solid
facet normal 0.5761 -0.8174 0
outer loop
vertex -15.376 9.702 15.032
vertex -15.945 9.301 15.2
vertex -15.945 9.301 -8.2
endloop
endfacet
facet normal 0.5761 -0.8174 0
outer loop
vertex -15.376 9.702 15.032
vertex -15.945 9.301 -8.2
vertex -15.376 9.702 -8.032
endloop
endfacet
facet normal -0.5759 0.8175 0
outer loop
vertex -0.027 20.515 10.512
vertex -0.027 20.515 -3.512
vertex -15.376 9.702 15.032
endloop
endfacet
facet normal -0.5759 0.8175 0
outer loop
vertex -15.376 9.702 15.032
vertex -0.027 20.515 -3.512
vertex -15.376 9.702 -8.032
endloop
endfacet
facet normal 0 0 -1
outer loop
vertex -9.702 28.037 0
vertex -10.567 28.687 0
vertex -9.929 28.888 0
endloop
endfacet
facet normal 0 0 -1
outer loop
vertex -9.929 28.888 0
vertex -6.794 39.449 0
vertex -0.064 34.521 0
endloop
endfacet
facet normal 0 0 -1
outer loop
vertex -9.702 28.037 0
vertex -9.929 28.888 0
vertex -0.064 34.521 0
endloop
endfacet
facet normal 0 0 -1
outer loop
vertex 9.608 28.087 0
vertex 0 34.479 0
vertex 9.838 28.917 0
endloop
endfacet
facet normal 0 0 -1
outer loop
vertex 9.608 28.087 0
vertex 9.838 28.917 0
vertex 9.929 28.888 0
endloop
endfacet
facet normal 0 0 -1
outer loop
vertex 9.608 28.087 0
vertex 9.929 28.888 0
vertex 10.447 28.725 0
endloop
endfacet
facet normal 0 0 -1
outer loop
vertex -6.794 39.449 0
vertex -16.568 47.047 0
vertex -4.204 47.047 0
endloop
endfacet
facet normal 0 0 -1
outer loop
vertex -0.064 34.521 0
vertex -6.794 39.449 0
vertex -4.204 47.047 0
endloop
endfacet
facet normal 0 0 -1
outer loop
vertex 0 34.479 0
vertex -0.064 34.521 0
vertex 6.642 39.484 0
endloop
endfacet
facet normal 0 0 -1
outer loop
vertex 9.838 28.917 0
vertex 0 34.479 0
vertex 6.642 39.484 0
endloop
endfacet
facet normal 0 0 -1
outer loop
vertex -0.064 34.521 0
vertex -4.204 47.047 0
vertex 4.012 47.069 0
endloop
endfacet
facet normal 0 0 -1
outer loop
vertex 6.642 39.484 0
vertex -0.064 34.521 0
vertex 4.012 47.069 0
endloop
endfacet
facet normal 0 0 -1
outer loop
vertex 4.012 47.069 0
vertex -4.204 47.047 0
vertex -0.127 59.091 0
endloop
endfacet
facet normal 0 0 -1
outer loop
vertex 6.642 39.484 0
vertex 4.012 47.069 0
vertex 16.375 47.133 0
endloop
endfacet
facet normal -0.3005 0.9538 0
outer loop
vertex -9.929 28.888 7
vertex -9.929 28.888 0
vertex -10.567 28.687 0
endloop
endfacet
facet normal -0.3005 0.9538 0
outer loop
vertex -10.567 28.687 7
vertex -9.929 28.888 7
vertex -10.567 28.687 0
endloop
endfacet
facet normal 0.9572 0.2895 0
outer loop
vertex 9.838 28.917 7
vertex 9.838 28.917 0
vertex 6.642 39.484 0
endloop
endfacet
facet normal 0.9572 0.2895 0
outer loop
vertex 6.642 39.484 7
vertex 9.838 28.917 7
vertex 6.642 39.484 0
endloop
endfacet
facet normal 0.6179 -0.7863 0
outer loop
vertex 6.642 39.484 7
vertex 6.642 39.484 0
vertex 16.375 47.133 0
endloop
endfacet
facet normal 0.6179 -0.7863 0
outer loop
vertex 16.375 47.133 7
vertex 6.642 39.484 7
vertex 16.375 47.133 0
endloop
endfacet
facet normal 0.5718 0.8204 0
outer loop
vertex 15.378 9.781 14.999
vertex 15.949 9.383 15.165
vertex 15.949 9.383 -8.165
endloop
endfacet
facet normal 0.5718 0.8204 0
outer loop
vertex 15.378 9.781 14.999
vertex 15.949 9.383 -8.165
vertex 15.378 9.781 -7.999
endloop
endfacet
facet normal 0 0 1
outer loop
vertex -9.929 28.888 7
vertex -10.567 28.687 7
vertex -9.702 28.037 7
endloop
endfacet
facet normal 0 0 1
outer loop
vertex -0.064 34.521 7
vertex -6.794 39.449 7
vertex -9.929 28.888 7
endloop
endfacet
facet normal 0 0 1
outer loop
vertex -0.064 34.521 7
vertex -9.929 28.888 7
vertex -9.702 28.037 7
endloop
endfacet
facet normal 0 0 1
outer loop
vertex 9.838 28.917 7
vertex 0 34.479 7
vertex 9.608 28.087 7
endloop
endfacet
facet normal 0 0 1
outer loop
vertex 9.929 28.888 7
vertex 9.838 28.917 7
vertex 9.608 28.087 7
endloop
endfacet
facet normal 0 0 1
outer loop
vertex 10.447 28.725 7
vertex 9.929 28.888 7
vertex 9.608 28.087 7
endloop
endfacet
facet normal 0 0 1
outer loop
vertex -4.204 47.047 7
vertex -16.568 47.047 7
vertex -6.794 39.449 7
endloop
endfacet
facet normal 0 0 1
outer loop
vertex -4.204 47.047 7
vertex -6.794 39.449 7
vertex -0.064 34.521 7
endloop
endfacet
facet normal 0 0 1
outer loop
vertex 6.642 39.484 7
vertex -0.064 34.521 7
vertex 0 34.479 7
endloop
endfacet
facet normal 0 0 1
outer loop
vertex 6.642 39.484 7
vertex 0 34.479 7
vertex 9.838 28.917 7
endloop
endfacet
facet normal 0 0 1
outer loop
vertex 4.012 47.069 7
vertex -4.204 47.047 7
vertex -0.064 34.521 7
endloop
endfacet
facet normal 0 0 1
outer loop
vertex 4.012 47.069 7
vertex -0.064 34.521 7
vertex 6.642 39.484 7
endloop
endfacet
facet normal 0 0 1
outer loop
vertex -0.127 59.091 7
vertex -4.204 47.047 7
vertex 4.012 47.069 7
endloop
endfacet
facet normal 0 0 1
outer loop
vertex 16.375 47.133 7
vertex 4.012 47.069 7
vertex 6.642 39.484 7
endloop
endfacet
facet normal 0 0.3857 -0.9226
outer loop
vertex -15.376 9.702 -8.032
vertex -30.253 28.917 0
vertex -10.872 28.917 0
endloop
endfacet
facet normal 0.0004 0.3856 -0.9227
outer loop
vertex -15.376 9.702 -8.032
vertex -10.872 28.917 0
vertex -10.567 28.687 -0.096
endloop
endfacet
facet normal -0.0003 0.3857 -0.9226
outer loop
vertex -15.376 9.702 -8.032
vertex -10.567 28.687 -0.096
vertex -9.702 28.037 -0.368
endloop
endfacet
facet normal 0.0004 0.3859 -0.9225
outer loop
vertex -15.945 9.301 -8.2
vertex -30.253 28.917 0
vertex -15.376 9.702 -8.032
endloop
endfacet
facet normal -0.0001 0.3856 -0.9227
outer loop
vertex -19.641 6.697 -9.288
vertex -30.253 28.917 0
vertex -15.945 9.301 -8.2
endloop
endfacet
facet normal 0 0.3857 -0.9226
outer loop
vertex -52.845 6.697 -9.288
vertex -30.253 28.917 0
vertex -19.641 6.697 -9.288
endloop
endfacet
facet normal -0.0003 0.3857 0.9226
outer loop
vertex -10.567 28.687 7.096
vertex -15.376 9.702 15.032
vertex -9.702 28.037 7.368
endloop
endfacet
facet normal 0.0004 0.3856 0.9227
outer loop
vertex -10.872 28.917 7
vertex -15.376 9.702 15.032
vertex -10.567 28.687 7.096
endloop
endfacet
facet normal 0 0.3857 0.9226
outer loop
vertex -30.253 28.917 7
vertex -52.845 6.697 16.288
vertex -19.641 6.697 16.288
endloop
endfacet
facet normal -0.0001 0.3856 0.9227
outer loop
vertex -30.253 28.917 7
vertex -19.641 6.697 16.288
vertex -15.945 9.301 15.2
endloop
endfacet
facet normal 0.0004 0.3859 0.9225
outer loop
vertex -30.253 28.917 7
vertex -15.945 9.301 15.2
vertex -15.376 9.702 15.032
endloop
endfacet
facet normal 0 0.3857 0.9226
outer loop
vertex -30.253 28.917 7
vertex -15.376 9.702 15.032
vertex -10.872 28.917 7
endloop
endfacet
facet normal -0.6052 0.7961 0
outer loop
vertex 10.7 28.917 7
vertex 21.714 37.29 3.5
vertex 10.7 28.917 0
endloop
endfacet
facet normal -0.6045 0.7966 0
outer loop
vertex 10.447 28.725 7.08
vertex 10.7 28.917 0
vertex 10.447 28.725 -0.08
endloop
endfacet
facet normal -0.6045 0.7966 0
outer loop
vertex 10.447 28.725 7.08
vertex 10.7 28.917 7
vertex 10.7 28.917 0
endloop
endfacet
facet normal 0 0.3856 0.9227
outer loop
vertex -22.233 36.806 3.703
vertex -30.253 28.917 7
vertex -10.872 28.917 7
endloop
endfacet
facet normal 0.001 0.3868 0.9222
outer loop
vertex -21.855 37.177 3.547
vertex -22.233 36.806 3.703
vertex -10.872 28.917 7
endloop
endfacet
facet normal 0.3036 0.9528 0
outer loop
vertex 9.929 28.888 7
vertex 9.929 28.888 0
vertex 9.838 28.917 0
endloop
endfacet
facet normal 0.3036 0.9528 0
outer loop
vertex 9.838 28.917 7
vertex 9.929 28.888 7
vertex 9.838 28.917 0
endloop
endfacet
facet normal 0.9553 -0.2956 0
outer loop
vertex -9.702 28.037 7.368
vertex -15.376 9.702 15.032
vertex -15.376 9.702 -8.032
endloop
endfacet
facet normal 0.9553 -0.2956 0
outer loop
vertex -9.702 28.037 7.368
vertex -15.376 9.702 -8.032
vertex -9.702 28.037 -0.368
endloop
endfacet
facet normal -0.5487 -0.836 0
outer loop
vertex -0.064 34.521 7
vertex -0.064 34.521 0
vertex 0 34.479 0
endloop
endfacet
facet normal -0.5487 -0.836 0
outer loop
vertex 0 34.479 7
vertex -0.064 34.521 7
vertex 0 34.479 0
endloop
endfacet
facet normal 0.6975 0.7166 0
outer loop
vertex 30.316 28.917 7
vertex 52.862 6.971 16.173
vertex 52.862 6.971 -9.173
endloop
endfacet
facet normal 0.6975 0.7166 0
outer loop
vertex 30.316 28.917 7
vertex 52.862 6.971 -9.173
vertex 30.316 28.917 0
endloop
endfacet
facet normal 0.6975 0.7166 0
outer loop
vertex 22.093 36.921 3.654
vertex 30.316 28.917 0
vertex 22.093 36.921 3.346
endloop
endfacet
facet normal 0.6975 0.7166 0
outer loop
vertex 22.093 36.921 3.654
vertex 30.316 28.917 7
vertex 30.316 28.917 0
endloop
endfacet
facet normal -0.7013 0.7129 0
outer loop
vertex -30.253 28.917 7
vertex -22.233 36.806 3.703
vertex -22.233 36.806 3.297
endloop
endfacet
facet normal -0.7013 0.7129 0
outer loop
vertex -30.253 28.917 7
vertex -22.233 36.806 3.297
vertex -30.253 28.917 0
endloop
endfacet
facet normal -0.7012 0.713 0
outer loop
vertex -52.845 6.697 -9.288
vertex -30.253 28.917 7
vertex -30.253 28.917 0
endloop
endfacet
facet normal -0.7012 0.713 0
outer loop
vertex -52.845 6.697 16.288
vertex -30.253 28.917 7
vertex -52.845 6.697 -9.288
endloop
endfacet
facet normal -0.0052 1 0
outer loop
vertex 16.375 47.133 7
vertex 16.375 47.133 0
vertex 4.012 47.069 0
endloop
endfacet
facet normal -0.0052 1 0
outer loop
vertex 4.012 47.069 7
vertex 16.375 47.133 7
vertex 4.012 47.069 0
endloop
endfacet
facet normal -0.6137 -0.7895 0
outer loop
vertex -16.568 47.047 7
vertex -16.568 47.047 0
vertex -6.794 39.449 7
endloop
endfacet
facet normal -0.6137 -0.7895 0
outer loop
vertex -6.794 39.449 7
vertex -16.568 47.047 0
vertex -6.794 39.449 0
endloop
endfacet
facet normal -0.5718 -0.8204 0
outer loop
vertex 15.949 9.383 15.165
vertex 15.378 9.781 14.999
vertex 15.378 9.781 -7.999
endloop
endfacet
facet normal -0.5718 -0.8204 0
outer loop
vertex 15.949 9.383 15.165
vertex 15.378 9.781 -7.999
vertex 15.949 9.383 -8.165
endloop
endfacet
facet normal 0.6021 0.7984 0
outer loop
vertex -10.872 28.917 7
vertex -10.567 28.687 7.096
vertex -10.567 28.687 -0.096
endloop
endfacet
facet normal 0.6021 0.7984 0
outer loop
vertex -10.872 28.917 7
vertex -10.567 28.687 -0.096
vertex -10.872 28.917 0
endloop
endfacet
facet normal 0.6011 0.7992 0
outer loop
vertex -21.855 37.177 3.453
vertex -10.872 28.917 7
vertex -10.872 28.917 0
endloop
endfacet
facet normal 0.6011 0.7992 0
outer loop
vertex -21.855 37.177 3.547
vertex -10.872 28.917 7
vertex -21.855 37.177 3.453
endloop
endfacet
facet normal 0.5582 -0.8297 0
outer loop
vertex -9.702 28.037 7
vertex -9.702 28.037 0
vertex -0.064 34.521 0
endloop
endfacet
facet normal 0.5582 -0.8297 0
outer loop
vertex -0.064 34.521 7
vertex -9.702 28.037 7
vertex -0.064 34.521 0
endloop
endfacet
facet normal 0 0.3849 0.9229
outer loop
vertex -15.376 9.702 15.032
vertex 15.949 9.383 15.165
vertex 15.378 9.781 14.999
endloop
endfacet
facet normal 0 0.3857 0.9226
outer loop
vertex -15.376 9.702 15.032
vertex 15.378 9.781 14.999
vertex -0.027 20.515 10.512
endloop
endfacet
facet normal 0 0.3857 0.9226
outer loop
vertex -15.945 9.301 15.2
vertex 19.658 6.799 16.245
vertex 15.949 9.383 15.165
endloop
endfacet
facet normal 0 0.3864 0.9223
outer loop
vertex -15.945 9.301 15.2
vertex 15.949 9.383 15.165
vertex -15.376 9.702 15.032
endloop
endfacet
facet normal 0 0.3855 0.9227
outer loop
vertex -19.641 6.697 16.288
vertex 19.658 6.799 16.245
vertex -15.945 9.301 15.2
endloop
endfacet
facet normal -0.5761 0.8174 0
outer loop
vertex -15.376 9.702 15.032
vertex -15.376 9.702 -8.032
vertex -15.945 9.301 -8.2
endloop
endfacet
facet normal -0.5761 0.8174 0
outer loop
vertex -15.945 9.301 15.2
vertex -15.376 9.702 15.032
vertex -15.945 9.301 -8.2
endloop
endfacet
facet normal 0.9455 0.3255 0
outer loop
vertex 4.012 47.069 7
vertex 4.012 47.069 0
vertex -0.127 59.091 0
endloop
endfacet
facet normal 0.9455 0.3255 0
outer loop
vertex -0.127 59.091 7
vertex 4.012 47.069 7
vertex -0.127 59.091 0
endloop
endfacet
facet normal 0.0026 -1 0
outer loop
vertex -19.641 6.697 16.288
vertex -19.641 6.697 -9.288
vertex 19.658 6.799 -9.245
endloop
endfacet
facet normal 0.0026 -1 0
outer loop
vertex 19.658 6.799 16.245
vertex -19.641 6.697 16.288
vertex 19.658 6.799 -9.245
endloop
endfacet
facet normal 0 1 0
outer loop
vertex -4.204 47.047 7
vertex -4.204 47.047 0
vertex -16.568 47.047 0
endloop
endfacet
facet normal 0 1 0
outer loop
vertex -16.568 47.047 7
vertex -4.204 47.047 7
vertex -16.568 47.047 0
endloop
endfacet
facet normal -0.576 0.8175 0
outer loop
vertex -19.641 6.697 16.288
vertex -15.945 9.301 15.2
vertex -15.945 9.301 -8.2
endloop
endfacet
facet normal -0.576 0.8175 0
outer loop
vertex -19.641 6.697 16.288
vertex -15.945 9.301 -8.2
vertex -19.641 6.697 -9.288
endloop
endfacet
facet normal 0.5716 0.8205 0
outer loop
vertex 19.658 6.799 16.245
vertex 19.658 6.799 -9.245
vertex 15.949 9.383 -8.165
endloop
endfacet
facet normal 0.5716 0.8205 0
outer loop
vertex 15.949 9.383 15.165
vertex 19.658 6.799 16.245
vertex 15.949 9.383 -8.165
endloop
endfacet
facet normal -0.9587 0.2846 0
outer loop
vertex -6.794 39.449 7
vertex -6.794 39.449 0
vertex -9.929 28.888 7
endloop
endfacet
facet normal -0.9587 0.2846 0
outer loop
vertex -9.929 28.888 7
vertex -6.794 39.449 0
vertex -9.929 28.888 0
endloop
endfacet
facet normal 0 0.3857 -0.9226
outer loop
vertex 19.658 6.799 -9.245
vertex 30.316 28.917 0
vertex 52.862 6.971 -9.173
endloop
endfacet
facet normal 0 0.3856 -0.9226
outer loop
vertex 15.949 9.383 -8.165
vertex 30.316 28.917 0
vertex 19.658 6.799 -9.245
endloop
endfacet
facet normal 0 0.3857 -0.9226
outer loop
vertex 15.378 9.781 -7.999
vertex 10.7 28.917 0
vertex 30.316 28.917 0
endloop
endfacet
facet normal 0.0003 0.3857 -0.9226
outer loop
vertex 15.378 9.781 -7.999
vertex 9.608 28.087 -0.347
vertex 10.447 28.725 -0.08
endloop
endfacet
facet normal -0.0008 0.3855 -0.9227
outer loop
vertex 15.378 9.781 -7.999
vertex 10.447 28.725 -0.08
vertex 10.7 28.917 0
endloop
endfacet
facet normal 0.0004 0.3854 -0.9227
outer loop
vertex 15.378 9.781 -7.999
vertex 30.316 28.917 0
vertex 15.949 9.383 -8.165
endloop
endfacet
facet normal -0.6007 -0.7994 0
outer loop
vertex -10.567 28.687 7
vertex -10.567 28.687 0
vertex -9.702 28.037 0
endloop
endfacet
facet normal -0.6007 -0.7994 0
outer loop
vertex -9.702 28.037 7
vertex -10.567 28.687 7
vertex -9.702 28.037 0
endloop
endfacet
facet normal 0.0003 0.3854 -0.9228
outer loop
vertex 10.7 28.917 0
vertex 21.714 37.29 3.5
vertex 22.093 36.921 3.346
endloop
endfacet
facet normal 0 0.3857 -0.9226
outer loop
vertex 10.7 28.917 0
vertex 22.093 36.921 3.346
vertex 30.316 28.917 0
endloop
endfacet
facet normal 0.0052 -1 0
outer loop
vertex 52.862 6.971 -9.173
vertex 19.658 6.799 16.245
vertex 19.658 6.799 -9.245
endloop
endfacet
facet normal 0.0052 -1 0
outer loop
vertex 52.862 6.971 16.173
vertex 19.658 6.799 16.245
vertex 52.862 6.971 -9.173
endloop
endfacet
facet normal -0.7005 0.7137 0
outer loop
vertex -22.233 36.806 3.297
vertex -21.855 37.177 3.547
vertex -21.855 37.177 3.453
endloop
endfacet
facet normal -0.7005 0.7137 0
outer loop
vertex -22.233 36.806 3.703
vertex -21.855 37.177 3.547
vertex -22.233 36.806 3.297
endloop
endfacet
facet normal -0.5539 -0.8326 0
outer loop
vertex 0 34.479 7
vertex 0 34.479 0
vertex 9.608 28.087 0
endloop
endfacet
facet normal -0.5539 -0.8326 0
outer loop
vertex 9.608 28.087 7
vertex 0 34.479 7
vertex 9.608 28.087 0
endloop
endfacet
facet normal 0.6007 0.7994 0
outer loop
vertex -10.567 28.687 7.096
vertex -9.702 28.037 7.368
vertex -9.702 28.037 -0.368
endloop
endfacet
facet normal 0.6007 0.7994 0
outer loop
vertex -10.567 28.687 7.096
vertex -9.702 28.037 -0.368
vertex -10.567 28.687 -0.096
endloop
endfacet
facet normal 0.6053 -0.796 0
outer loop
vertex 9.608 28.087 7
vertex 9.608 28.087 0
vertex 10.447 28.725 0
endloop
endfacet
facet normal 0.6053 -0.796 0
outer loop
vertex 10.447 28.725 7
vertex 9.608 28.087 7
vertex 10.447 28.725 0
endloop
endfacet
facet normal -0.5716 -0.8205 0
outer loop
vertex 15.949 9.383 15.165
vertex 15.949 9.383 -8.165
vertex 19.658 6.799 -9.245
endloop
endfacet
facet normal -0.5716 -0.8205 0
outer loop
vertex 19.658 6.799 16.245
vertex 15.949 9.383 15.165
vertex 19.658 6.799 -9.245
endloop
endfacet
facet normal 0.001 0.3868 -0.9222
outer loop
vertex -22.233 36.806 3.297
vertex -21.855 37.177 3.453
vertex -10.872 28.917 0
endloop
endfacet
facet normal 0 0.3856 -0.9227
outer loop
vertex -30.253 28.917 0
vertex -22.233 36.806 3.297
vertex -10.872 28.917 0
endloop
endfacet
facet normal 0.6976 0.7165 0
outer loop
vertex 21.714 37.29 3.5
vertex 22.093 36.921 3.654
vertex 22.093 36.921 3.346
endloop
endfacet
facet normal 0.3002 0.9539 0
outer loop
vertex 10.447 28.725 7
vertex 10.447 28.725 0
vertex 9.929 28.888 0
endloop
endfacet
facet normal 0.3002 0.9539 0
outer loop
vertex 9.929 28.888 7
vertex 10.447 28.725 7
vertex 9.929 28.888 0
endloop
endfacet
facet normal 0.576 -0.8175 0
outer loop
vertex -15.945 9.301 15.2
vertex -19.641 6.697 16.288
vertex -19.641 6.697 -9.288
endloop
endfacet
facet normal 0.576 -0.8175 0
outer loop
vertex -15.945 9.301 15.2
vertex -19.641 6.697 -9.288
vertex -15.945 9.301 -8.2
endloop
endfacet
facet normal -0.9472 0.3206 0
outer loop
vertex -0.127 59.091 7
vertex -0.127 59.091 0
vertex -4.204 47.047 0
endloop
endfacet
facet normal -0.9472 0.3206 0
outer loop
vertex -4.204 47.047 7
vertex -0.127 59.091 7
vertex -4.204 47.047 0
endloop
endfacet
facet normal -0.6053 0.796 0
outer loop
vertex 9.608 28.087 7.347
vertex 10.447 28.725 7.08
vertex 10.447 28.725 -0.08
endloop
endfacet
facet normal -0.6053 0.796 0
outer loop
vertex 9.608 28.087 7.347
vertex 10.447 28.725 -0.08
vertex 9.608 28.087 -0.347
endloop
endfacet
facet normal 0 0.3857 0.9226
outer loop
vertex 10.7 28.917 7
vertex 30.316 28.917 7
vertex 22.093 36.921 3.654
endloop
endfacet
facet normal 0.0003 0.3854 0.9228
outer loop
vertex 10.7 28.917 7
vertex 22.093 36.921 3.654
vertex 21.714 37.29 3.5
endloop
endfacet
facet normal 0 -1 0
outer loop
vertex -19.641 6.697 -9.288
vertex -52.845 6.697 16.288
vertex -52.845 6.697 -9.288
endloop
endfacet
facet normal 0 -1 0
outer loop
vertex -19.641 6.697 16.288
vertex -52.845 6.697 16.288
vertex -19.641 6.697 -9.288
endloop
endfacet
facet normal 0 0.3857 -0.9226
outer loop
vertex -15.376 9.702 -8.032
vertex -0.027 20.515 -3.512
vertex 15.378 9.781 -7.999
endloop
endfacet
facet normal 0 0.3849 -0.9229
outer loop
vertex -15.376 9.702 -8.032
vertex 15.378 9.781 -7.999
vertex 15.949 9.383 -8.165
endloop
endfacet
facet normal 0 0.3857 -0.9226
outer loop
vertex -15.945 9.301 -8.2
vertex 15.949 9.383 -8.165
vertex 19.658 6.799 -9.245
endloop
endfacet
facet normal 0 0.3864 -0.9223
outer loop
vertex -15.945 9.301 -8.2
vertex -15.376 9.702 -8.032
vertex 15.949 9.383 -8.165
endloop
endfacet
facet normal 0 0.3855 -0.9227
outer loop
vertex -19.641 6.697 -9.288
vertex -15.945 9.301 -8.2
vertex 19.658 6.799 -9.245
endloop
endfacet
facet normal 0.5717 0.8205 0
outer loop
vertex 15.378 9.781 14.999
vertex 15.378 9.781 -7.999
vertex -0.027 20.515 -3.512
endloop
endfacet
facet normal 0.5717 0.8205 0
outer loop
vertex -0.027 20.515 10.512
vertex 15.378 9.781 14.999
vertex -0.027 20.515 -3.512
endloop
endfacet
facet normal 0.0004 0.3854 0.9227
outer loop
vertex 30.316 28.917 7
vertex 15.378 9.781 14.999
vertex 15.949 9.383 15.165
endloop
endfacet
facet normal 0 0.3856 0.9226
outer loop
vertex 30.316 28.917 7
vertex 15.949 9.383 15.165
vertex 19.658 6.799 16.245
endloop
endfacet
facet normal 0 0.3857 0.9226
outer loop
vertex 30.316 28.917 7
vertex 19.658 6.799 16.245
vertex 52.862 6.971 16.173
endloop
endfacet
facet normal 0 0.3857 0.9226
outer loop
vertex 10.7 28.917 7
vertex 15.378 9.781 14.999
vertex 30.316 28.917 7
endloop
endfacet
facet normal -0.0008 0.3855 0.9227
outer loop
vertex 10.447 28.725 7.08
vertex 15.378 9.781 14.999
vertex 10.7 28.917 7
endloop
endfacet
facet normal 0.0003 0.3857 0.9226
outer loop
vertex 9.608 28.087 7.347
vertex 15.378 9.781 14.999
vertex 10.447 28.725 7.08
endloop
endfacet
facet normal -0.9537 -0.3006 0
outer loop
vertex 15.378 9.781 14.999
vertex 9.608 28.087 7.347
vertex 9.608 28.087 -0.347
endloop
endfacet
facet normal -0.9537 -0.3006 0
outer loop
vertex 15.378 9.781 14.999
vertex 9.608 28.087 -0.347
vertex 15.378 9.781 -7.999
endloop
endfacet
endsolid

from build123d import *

# Parameters (mm, degrees)
F1_DEPTH      = 7
F2_DEPTH      = 7
F3_DEPTH      = 25
F4_DEPTH      = 25
F5_DEPTH      = 25
F6_DEPTH      = 25
F8_DEPTH      = 52.8462768922
F8_DEPTH_BACK = 52.8629522723


with BuildPart() as f1:
    # F0 (on Top) → F1 (new body)
    with BuildSketch(Plane.XY):
        Polygon((-21.854923692, 37.1773435624), (-22.2325250506, 36.8059538305), (-52.8452768922, 6.6967885941), (-19.641056972, 6.6967885941), (-15.9451588988, 9.3006277457), (-15.3760976448, 9.7015435566), (-9.7015127861, 28.0367903236), (-10.566638607, 28.6874495242), align=None)
    extrude(amount=F1_DEPTH)

    # F3#2 (add): a face of the model
    f3_2_faces = [f1.faces().sort_by_distance(p)[0] for p in [
        (-27.1983175925, 18.5191974615, 7),
    ]]
    extrude(f3_2_faces, amount=F3_DEPTH)

    # F0 (on Top) → F4, piece 2 (join)
    with BuildSketch(Plane.XY):
        Polygon((-21.854923692, 37.1773435624), (-22.2325250506, 36.8059538305), (-52.8452768922, 6.6967885941), (-19.641056972, 6.6967885941), (-15.9451588988, 9.3006277457), (-15.3760976448, 9.7015435566), (-9.7015127861, 28.0367903236), (-10.566638607, 28.6874495242), align=None)
    extrude(amount=-F4_DEPTH)


with BuildPart() as f1b:
    # F0 (on Top) → F1, piece 2 (new body)
    with BuildSketch(Plane.XY):
        Polygon((15.9488124875, 9.3834251701), (19.6581798972, 6.7988102444), (52.8619522723, 6.9712067974), (22.0932860403, 36.9210245738), (21.713761513, 37.2904487909), (10.4473401343, 28.7250548337), (9.6079722369, 28.0869181552), (15.3776773458, 9.7813810071), align=None)
    extrude(amount=F1_DEPTH)

    # F3 (add): a face of the model
    f3_faces = [f1b.faces().sort_by_distance(p)[0] for p in [
        (27.1539566234, 18.6602971152, 7),
    ]]
    extrude(f3_faces, amount=F3_DEPTH)

    # F0 (on Top) → F4 (join)
    with BuildSketch(Plane.XY):
        Polygon((15.9488124875, 9.3834251701), (19.6581798972, 6.7988102444), (52.8619522723, 6.9712067974), (22.0932860403, 36.9210245738), (21.713761513, 37.2904487909), (10.4473401343, 28.7250548337), (9.6079722369, 28.0869181552), (15.3776773458, 9.7813810071), align=None)
    extrude(amount=-F4_DEPTH)


with BuildPart() as f2:
    # F0 (on Top) → F2 (new body)
    with BuildSketch(Plane.XY):
        Polygon((-15.9451588988, 9.3006277457), (-19.641056972, 6.6967885941), (19.6581798972, 6.7988102444), (15.9488124875, 9.3834251701), (15.3776773458, 9.7813810071), (-0.0271789608, 20.5151846831), (-15.3760976448, 9.7015435566), align=None)
    extrude(amount=F2_DEPTH)

    # F0 (on Top) → F5 (join)
    with BuildSketch(Plane.XY):
        Polygon((-15.9451588988, 9.3006277457), (-19.641056972, 6.6967885941), (19.6581798972, 6.7988102444), (15.9488124875, 9.3834251701), (15.3776773458, 9.7813810071), (-0.0271789608, 20.5151846831), (-15.3760976448, 9.7015435566), align=None)
    extrude(amount=-F5_DEPTH)

    # F6 (add): a face of the model
    f6_faces = [f2.faces().sort_by_distance(p)[0] for p in [
        (-0.0033520119, 11.3369278406, 7),
    ]]
    extrude(f6_faces, amount=F6_DEPTH)


with BuildPart() as f2b:
    # F0 (on Top) → F2, piece 2 (new body)
    with BuildSketch(Plane.XY):
        Polygon((-9.9289040496, 28.8884764516), (-10.566638607, 28.6874495242), (-9.7015127861, 28.0367903236), (-0.0635392434, 34.5213427361), (0, 34.4790702877), (9.6079722369, 28.0869181552), (10.4473401343, 28.7250548337), (9.9289040496, 28.8884764516), (9.837764806, 28.9172053984), (6.641519679, 39.484072189), (16.3754133549, 47.1329648367), (4.0123272981, 47.0687747382), (-0.1273227543, 59.0910619484), (-4.204497207, 47.0474436879), (-16.5677499026, 47.0474436879), (-6.794274319, 39.4491925836), align=None)
    extrude(amount=F2_DEPTH)


with BuildPart() as f8_tool:
    # F7 (on Right) → F8 (new body, two sides)
    with BuildSketch(Plane.YZ) as f8_sk:
        Polygon((28.9172053984, 7), (37.2904487909, 3.5), (40.2094684541, 37.8902927041), (3.4889901212, 37.8902927041), (3.4889901212, 17.6289461917), align=None)
        Polygon((40.2094684541, -30.8902927041), (37.2904487909, 3.5), (28.9172053984, 0), (3.4889901212, -10.6289461917), (3.4889901212, -30.8902927041), align=None)
    extrude(amount=-F8_DEPTH)
    extrude(f8_sk.sketch, amount=F8_DEPTH_BACK)


with BuildPart() as f1_1:
    add(f1.part)

    # F8: cut by f8_tool
    add(f8_tool.part, mode=Mode.SUBTRACT)


with BuildPart() as f1b_1:
    add(f1b.part)

    # F8: cut by f8_tool
    add(f8_tool.part, mode=Mode.SUBTRACT)


with BuildPart() as f2_1:
    add(f2.part)

    # F8: cut by f8_tool
    add(f8_tool.part, mode=Mode.SUBTRACT)


solid = Compound([f2b.part, f1_1.part, f1b_1.part, f2_1.part])
